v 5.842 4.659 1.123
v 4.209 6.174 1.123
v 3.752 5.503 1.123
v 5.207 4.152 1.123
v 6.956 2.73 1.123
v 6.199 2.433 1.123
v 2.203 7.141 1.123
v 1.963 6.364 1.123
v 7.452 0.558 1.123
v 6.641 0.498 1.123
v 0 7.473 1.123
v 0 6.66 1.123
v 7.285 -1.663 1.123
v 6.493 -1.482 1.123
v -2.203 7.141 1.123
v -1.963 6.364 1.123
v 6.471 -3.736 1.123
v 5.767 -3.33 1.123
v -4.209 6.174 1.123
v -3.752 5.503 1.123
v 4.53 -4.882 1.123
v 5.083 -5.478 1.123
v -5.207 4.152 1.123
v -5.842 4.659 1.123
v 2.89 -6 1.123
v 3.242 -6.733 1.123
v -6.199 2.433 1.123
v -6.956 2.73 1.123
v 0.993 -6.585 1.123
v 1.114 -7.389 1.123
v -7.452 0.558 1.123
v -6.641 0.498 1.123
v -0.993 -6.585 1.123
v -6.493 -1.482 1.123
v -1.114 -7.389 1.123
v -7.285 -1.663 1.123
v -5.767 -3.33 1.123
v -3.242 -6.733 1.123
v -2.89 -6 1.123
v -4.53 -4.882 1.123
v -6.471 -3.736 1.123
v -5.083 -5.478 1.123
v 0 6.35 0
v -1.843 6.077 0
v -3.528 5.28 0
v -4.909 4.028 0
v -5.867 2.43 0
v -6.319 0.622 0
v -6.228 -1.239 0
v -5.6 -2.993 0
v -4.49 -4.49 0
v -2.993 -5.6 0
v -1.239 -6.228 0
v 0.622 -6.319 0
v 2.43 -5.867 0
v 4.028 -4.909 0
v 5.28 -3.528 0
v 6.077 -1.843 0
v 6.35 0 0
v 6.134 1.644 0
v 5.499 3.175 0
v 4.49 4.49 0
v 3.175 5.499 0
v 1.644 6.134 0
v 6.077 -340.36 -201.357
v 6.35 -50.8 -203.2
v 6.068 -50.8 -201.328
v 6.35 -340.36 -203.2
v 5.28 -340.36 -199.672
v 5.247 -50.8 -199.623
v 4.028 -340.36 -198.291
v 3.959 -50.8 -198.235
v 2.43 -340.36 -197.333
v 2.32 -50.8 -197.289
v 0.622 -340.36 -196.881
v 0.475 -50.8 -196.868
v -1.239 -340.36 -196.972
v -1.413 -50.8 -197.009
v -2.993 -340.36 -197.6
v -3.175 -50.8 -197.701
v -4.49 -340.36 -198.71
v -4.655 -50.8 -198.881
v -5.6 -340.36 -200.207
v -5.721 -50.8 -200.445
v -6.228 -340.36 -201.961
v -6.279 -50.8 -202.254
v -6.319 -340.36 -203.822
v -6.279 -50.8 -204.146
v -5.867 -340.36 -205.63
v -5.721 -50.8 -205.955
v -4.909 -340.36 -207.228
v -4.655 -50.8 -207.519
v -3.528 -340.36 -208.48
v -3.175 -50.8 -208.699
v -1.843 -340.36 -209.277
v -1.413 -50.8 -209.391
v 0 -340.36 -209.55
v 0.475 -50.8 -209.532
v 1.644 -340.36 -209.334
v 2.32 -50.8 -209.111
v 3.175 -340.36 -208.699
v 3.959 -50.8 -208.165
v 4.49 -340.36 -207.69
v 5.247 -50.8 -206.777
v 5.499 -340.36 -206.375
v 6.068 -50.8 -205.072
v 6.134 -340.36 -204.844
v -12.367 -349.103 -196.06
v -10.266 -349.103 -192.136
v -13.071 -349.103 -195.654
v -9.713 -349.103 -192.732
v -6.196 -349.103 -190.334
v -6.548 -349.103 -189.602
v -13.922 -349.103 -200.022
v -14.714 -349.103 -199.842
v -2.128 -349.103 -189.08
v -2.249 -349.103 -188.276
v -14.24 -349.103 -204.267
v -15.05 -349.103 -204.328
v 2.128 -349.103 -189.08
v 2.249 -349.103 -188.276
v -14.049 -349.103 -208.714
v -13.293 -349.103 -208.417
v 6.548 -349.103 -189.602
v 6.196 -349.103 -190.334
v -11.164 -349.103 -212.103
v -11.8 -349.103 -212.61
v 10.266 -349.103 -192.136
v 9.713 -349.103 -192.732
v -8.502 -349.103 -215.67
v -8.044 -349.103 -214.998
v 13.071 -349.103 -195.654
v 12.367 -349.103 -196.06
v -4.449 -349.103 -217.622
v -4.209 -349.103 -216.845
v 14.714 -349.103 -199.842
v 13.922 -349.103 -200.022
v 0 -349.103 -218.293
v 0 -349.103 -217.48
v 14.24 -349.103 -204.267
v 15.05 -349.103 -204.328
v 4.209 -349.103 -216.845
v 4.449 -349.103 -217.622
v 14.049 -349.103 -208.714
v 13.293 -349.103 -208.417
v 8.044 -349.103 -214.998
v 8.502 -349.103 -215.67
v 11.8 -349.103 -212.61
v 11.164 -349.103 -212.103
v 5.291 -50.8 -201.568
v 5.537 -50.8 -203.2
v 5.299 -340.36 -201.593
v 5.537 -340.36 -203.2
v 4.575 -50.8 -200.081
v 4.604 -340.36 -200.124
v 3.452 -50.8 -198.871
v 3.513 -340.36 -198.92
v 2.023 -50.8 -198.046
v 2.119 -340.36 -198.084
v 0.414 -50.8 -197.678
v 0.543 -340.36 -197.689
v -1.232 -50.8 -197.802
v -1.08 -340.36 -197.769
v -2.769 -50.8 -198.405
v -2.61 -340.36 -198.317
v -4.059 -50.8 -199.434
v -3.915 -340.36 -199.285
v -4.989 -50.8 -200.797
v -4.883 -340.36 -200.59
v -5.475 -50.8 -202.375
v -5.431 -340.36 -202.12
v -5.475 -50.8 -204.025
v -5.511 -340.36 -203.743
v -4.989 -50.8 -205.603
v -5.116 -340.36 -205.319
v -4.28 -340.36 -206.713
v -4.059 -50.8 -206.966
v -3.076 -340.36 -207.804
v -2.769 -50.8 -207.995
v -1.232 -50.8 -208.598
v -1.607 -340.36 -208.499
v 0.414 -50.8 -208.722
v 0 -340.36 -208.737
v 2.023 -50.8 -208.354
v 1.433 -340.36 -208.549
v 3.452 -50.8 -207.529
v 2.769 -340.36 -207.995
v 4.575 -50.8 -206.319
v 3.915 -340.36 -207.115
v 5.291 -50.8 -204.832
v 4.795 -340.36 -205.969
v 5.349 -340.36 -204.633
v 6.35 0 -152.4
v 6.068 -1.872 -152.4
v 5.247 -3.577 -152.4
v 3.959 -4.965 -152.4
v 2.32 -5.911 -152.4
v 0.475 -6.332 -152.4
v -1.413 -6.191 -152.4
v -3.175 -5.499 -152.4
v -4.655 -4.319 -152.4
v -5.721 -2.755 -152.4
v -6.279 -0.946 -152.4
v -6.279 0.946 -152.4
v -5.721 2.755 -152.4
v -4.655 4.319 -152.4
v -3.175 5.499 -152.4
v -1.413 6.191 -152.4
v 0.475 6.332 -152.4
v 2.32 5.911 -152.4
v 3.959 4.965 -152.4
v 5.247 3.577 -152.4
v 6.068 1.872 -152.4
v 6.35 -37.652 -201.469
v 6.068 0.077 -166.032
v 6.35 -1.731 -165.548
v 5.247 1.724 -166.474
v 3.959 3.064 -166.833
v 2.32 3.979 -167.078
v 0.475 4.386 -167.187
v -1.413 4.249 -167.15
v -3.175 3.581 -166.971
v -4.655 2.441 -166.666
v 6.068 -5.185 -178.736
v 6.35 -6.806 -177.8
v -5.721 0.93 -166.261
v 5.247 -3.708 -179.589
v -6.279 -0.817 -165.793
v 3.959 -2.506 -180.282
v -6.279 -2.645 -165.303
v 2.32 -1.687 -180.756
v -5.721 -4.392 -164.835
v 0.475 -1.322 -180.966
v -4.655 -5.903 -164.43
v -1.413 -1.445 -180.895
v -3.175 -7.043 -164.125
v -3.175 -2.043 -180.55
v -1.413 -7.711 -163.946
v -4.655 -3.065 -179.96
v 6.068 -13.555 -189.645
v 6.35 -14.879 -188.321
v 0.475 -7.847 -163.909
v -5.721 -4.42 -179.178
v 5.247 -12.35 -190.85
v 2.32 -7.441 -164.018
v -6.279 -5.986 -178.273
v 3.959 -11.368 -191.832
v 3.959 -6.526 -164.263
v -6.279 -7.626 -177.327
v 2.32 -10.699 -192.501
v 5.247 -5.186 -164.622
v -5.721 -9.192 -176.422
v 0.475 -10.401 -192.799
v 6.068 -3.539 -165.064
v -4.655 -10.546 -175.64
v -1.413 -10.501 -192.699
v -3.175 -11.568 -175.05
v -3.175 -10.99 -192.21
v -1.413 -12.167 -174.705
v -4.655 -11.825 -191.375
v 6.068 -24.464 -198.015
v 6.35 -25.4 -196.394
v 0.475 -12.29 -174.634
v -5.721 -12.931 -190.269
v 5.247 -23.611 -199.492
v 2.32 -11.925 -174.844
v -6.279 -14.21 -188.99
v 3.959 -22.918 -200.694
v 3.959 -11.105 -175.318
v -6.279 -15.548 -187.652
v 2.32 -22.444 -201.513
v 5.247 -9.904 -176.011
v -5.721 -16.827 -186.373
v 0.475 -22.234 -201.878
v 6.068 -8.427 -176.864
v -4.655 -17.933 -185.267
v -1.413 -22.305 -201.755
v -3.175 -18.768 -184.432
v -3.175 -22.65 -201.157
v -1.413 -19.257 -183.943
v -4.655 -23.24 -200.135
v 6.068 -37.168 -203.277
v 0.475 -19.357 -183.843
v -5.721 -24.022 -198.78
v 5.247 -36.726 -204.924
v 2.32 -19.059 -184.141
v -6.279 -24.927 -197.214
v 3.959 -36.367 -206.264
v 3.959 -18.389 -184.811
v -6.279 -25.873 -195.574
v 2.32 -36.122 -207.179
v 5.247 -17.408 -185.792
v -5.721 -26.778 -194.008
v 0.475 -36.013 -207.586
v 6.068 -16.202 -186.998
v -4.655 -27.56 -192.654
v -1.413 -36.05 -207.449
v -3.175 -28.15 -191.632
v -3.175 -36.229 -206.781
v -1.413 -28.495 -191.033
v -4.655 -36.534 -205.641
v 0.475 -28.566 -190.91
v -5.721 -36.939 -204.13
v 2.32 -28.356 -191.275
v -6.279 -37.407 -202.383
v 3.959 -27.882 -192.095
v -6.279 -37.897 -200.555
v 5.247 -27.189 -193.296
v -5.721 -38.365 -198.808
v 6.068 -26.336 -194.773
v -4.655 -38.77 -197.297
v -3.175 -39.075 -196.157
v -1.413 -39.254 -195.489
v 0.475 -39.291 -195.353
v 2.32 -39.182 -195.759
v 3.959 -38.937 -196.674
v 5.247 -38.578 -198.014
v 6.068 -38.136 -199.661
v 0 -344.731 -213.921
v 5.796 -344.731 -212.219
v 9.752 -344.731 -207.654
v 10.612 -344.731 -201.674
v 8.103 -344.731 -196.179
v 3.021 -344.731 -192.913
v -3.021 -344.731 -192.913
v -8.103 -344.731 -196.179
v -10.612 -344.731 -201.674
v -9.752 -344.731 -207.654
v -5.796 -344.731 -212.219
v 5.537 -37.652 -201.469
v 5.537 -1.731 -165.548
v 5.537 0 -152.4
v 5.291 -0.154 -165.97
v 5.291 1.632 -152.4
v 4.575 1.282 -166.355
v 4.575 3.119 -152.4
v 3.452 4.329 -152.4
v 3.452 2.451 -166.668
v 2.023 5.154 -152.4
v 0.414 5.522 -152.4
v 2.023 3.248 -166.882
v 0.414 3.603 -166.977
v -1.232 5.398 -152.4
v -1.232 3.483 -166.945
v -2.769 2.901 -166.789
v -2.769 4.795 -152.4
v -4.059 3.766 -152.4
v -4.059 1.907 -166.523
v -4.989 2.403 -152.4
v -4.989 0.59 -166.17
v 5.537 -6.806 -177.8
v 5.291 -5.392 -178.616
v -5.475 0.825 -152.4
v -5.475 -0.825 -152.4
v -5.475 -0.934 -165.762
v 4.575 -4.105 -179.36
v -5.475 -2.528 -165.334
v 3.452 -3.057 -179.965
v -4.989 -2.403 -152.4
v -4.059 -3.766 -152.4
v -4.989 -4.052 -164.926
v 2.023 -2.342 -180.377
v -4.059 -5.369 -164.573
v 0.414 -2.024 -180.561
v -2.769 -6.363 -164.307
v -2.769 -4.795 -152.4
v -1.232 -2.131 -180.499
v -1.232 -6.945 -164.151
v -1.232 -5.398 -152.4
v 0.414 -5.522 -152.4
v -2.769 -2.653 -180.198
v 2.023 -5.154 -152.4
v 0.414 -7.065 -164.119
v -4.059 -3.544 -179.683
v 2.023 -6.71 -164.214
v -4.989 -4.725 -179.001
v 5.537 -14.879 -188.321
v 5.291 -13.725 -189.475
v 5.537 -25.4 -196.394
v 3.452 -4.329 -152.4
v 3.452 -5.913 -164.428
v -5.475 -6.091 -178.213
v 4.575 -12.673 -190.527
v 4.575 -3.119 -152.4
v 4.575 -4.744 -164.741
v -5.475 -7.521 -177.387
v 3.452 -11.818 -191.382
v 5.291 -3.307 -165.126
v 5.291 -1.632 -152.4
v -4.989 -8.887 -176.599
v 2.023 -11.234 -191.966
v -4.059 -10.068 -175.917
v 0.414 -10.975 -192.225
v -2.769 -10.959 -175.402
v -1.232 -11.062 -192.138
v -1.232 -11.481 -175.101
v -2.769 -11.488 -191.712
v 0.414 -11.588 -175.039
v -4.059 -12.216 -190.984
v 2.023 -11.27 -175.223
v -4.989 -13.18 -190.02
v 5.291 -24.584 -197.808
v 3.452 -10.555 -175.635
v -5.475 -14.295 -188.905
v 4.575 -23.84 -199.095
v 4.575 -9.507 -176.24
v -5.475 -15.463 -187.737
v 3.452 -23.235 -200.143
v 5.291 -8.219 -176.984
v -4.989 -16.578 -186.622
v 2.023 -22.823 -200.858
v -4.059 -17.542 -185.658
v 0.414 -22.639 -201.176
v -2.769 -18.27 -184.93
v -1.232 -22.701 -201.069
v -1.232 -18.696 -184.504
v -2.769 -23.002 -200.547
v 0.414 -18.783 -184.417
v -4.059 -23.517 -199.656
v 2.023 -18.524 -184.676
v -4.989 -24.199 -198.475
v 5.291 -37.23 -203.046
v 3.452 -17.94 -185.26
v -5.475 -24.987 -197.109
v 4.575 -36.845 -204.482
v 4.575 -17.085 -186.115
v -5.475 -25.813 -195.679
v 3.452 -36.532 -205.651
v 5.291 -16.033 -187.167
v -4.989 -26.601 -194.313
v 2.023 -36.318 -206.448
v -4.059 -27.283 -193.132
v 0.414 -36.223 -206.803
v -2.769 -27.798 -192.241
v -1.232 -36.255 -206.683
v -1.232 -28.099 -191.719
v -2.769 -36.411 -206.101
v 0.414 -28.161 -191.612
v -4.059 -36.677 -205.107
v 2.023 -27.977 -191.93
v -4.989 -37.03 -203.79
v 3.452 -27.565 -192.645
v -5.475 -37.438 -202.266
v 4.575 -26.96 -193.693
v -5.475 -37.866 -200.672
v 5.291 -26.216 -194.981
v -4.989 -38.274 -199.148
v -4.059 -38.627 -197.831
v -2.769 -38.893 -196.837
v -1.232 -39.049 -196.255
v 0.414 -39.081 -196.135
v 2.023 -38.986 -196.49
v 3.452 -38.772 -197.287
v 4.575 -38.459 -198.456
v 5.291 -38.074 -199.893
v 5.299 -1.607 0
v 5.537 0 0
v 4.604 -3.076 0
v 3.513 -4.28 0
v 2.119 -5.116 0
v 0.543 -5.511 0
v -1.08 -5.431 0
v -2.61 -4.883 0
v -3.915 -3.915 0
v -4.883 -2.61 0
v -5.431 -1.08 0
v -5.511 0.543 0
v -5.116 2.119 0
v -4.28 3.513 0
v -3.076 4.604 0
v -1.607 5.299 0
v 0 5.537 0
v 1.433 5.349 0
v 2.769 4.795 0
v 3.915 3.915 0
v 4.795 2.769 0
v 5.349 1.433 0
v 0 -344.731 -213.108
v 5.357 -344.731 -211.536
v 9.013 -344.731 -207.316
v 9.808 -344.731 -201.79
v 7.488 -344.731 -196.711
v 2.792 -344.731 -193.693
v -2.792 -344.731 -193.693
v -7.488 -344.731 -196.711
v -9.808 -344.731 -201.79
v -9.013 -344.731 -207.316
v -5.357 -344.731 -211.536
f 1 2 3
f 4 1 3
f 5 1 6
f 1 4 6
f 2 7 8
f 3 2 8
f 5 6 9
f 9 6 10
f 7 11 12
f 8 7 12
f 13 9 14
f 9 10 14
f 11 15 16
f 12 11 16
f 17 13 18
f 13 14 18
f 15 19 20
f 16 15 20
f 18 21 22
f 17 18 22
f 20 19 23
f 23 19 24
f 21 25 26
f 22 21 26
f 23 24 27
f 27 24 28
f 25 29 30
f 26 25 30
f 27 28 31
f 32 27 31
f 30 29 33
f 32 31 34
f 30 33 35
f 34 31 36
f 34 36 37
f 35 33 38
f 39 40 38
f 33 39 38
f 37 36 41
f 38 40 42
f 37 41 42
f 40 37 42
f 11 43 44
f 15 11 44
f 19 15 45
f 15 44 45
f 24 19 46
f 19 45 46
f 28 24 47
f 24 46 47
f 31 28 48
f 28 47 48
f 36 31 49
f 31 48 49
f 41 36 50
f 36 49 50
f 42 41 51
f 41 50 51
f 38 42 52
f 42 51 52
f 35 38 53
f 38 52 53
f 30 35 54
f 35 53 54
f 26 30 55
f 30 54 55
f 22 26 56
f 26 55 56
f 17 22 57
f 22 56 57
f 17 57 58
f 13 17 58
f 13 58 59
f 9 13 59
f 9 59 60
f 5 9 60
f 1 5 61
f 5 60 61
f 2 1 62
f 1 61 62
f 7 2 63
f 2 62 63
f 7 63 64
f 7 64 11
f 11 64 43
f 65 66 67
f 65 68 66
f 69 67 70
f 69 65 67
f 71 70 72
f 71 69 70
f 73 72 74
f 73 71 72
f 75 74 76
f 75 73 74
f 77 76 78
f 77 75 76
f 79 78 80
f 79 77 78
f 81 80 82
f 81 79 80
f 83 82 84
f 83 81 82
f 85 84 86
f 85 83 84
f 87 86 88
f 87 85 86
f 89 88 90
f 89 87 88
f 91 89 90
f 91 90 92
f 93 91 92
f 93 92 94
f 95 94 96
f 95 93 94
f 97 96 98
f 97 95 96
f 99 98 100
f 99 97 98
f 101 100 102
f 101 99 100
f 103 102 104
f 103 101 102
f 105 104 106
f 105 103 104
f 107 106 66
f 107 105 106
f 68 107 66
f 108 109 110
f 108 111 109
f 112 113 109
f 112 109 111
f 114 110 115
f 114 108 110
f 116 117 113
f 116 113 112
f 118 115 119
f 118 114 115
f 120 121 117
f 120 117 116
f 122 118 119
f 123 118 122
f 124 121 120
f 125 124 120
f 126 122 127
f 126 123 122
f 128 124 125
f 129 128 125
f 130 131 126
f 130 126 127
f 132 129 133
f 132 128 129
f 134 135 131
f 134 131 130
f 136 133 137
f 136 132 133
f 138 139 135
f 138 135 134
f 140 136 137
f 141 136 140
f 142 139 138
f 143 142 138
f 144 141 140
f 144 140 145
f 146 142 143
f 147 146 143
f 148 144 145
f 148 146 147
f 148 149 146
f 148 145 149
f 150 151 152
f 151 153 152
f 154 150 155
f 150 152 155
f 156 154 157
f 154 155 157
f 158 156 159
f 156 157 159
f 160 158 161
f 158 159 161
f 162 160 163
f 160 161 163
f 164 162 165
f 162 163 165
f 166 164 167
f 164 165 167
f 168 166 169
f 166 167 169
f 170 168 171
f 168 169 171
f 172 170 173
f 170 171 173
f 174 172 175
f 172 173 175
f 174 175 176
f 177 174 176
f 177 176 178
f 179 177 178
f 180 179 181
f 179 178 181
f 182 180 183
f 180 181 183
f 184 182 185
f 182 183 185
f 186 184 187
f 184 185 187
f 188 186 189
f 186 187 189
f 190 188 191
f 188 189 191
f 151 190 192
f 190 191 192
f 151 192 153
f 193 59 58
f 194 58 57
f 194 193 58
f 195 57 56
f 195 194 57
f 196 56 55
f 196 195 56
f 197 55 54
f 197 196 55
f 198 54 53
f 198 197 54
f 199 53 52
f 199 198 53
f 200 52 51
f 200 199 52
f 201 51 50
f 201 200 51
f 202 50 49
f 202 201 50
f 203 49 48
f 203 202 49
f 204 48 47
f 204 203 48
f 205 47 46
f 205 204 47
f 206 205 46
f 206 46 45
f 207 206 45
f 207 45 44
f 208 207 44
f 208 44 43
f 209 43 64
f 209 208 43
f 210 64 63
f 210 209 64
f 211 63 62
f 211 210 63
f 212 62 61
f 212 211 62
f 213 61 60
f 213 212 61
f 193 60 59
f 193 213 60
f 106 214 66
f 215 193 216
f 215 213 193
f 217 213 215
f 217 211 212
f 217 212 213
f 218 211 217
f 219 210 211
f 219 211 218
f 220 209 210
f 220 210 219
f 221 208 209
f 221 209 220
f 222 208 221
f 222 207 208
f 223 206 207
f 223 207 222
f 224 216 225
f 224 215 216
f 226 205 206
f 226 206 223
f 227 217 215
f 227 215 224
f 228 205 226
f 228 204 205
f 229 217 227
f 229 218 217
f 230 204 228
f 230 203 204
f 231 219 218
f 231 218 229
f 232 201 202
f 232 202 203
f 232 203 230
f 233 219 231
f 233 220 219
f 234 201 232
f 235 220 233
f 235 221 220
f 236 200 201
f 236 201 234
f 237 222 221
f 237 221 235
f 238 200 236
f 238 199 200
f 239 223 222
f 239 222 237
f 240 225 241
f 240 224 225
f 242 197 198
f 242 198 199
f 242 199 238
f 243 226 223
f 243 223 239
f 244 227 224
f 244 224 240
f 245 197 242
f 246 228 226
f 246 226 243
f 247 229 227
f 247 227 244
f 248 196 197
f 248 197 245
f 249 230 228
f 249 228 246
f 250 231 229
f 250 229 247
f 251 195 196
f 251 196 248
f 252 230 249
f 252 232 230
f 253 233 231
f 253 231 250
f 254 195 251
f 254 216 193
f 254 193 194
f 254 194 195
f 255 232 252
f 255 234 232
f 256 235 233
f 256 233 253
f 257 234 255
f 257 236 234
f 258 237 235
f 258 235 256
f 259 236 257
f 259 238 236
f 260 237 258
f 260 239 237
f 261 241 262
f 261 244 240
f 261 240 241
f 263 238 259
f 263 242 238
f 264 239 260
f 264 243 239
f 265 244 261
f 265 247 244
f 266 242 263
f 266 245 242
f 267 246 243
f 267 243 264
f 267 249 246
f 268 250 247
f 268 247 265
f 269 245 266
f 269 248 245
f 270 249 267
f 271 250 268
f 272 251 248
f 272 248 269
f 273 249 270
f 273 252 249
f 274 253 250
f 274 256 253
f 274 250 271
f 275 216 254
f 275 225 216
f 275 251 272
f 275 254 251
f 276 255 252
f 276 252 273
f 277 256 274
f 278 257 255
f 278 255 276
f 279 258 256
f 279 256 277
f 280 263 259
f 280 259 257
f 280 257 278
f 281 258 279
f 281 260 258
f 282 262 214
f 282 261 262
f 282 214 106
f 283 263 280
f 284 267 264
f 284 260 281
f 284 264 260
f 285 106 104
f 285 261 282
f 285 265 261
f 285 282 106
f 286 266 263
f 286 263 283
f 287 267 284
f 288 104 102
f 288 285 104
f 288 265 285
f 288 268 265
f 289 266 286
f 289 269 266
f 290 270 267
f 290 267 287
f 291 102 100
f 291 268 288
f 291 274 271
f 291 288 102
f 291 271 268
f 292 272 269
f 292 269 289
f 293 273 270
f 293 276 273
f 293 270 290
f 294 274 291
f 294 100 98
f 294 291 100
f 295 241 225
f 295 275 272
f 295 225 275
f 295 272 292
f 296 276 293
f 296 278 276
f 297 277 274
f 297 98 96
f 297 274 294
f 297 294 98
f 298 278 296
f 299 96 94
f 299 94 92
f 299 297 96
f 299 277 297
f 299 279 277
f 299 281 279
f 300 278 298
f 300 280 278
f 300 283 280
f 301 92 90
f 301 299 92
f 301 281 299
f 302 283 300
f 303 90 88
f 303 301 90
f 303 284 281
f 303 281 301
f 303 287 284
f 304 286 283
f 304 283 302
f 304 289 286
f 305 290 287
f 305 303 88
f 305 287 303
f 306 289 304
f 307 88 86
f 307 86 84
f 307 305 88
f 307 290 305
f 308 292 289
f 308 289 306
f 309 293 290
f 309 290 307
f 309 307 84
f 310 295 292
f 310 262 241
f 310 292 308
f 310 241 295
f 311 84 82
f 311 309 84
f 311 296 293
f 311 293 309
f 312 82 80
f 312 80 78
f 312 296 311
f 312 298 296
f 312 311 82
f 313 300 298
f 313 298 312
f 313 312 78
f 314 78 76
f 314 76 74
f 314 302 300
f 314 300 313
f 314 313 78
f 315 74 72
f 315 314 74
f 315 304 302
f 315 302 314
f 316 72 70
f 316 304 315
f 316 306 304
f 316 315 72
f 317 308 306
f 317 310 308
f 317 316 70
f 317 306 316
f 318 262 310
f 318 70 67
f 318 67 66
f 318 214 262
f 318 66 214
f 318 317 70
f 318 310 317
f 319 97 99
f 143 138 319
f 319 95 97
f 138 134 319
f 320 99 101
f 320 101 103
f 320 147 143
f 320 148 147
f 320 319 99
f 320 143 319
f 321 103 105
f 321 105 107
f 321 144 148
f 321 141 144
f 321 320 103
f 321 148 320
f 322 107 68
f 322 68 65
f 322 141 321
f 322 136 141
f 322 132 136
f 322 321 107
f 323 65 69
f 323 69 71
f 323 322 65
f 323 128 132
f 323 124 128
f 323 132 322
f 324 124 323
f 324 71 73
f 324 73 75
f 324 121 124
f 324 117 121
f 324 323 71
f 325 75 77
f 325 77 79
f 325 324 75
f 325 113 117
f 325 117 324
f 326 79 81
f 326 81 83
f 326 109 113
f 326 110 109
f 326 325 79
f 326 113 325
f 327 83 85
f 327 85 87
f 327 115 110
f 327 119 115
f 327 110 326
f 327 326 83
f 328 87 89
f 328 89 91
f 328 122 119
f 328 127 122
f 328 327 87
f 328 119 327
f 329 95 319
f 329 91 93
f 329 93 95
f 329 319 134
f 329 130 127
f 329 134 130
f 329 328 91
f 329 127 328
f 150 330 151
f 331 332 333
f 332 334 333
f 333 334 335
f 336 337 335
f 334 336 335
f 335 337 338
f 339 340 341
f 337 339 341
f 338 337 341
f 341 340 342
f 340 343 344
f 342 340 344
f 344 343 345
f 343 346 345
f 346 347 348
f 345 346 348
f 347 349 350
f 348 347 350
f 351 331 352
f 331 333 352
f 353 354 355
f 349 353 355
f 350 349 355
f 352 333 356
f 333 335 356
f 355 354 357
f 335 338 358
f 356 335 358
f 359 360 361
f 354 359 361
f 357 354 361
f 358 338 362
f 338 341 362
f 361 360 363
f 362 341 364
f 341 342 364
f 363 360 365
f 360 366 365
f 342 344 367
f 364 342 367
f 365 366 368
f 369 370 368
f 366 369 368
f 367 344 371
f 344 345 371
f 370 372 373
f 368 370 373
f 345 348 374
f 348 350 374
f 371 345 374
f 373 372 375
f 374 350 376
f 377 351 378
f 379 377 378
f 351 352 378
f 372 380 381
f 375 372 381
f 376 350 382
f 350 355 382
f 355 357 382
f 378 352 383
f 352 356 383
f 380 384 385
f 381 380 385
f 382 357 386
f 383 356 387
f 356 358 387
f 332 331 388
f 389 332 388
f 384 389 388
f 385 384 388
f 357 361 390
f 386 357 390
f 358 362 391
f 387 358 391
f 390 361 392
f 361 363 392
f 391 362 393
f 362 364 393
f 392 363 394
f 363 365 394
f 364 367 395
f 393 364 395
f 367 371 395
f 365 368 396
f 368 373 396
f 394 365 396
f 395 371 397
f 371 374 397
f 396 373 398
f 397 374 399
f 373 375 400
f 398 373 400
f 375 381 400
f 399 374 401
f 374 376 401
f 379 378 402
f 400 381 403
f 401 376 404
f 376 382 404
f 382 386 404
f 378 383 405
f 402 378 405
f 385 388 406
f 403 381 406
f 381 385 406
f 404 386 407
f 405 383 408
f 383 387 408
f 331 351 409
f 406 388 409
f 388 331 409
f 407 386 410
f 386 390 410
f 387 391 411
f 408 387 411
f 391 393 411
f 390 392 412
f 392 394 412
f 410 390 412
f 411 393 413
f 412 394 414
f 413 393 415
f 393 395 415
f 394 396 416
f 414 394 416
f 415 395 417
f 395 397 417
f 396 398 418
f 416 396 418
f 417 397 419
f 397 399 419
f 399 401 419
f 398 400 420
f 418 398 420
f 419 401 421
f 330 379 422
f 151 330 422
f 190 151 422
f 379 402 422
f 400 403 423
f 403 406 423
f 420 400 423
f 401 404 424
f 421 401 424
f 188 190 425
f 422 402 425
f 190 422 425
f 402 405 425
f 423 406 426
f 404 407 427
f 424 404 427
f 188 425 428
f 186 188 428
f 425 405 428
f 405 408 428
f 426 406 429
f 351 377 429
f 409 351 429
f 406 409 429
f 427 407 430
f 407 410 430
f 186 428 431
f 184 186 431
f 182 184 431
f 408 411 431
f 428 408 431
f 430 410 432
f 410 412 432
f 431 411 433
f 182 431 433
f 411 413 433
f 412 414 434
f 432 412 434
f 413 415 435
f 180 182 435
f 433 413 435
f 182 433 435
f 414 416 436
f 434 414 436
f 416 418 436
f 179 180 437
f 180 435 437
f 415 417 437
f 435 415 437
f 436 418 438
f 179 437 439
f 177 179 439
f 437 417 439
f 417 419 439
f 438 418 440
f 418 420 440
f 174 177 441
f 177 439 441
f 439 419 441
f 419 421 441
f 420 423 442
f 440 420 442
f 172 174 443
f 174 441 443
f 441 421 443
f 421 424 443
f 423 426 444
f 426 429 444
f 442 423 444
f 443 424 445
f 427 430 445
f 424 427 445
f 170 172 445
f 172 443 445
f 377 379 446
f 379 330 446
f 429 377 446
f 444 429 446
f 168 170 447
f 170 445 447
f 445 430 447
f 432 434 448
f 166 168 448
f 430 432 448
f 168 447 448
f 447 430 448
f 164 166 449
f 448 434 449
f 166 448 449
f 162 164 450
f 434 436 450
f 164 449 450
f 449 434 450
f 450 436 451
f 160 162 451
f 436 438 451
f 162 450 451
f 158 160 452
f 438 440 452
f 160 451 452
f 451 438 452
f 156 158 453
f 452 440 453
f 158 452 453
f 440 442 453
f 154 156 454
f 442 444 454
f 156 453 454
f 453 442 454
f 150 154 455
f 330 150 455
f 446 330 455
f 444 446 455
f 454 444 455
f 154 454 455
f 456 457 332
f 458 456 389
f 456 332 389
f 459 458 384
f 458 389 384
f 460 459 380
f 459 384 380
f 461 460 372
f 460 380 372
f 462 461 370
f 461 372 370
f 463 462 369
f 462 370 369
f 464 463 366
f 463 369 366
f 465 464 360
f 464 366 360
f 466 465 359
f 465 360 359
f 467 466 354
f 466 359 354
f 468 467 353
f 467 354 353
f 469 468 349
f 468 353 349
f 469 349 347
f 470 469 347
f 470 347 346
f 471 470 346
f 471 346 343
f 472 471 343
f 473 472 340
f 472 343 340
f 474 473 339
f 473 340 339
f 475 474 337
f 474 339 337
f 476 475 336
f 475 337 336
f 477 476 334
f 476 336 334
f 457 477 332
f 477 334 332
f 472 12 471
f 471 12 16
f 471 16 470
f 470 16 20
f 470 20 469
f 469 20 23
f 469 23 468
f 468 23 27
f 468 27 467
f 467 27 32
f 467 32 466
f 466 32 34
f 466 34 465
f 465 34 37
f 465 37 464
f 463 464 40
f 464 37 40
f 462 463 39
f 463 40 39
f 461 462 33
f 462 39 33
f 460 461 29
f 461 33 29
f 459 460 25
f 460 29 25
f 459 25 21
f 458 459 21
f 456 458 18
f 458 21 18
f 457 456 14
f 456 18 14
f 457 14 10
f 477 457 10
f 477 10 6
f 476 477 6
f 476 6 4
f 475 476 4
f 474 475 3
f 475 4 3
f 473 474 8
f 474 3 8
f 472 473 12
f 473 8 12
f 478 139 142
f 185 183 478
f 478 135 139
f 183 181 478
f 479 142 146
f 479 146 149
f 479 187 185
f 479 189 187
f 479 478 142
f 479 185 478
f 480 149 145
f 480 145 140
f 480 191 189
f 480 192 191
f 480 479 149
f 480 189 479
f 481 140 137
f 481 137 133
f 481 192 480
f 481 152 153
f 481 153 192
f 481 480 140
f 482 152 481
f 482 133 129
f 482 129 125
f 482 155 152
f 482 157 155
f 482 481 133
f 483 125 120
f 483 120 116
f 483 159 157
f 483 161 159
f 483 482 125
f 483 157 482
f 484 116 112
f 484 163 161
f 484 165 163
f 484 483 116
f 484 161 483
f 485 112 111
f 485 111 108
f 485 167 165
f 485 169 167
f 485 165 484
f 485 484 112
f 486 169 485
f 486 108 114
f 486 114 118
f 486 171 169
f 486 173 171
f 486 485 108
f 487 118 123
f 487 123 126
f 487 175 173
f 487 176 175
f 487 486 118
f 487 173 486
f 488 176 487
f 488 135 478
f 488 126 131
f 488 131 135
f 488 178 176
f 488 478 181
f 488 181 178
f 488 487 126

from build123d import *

# Parameters (mm, degrees)
SKETCH1_R   = 6.35
SKETCH1_R_2 = 5.5372


with BuildPart() as part:
    # Sweep1: sweep along a path in Sketch2
    with BuildLine(Plane(origin=(0, 0, 0), x_dir=(0, 0, -1), z_dir=(1, 0, 0))) as sweep1_path:
        Line((0, 0), (152.4, 0))
        ThreePointArc((152.4, 0), (188.321024484, -14.878975516), (203.2, -50.8))
        Line((203.2, -50.8), (203.2, -340.36))
    # Sketch1 → Sweep1 (sweep)
    with BuildSketch(Plane.XY):
        Circle(SKETCH1_R)
        Circle(SKETCH1_R_2, mode=Mode.SUBTRACT)
    sweep(path=sweep1_path.line)

    # Sketch3 → Revolve1 (revolve)
    with BuildSketch(Plane(origin=(0, 0, 0), x_dir=(0, 0, -1), z_dir=(1, 0, 0))):
        Polygon((0, 5.5372), (-1.122532015, 6.659732015), (-1.122532015, 7.472532015), (0, 6.35), align=None)
    revolve(axis=Axis((0, 0, -10.129320082), (0, 0, 1)))

    # Sketch4 → Revolve2 (revolve)
    with BuildSketch(Plane(origin=(0, 0, 0), x_dir=(0, 0, -1), z_dir=(1, 0, 0)), mode=Mode.PRIVATE) as revolve2_sk:
        Polygon((196.85, -340.36), (188.107467985, -349.102532015), (188.920267985, -349.102532015), (197.6628, -340.36), align=None)
    revolve(revolve2_sk.sketch.rotate(Axis((0, -309.261339279, -203.2), (0, -1, 0)), 180), axis=Axis((0, -309.261339279, -203.2), (0, -1, 0)))


solid = part.part
